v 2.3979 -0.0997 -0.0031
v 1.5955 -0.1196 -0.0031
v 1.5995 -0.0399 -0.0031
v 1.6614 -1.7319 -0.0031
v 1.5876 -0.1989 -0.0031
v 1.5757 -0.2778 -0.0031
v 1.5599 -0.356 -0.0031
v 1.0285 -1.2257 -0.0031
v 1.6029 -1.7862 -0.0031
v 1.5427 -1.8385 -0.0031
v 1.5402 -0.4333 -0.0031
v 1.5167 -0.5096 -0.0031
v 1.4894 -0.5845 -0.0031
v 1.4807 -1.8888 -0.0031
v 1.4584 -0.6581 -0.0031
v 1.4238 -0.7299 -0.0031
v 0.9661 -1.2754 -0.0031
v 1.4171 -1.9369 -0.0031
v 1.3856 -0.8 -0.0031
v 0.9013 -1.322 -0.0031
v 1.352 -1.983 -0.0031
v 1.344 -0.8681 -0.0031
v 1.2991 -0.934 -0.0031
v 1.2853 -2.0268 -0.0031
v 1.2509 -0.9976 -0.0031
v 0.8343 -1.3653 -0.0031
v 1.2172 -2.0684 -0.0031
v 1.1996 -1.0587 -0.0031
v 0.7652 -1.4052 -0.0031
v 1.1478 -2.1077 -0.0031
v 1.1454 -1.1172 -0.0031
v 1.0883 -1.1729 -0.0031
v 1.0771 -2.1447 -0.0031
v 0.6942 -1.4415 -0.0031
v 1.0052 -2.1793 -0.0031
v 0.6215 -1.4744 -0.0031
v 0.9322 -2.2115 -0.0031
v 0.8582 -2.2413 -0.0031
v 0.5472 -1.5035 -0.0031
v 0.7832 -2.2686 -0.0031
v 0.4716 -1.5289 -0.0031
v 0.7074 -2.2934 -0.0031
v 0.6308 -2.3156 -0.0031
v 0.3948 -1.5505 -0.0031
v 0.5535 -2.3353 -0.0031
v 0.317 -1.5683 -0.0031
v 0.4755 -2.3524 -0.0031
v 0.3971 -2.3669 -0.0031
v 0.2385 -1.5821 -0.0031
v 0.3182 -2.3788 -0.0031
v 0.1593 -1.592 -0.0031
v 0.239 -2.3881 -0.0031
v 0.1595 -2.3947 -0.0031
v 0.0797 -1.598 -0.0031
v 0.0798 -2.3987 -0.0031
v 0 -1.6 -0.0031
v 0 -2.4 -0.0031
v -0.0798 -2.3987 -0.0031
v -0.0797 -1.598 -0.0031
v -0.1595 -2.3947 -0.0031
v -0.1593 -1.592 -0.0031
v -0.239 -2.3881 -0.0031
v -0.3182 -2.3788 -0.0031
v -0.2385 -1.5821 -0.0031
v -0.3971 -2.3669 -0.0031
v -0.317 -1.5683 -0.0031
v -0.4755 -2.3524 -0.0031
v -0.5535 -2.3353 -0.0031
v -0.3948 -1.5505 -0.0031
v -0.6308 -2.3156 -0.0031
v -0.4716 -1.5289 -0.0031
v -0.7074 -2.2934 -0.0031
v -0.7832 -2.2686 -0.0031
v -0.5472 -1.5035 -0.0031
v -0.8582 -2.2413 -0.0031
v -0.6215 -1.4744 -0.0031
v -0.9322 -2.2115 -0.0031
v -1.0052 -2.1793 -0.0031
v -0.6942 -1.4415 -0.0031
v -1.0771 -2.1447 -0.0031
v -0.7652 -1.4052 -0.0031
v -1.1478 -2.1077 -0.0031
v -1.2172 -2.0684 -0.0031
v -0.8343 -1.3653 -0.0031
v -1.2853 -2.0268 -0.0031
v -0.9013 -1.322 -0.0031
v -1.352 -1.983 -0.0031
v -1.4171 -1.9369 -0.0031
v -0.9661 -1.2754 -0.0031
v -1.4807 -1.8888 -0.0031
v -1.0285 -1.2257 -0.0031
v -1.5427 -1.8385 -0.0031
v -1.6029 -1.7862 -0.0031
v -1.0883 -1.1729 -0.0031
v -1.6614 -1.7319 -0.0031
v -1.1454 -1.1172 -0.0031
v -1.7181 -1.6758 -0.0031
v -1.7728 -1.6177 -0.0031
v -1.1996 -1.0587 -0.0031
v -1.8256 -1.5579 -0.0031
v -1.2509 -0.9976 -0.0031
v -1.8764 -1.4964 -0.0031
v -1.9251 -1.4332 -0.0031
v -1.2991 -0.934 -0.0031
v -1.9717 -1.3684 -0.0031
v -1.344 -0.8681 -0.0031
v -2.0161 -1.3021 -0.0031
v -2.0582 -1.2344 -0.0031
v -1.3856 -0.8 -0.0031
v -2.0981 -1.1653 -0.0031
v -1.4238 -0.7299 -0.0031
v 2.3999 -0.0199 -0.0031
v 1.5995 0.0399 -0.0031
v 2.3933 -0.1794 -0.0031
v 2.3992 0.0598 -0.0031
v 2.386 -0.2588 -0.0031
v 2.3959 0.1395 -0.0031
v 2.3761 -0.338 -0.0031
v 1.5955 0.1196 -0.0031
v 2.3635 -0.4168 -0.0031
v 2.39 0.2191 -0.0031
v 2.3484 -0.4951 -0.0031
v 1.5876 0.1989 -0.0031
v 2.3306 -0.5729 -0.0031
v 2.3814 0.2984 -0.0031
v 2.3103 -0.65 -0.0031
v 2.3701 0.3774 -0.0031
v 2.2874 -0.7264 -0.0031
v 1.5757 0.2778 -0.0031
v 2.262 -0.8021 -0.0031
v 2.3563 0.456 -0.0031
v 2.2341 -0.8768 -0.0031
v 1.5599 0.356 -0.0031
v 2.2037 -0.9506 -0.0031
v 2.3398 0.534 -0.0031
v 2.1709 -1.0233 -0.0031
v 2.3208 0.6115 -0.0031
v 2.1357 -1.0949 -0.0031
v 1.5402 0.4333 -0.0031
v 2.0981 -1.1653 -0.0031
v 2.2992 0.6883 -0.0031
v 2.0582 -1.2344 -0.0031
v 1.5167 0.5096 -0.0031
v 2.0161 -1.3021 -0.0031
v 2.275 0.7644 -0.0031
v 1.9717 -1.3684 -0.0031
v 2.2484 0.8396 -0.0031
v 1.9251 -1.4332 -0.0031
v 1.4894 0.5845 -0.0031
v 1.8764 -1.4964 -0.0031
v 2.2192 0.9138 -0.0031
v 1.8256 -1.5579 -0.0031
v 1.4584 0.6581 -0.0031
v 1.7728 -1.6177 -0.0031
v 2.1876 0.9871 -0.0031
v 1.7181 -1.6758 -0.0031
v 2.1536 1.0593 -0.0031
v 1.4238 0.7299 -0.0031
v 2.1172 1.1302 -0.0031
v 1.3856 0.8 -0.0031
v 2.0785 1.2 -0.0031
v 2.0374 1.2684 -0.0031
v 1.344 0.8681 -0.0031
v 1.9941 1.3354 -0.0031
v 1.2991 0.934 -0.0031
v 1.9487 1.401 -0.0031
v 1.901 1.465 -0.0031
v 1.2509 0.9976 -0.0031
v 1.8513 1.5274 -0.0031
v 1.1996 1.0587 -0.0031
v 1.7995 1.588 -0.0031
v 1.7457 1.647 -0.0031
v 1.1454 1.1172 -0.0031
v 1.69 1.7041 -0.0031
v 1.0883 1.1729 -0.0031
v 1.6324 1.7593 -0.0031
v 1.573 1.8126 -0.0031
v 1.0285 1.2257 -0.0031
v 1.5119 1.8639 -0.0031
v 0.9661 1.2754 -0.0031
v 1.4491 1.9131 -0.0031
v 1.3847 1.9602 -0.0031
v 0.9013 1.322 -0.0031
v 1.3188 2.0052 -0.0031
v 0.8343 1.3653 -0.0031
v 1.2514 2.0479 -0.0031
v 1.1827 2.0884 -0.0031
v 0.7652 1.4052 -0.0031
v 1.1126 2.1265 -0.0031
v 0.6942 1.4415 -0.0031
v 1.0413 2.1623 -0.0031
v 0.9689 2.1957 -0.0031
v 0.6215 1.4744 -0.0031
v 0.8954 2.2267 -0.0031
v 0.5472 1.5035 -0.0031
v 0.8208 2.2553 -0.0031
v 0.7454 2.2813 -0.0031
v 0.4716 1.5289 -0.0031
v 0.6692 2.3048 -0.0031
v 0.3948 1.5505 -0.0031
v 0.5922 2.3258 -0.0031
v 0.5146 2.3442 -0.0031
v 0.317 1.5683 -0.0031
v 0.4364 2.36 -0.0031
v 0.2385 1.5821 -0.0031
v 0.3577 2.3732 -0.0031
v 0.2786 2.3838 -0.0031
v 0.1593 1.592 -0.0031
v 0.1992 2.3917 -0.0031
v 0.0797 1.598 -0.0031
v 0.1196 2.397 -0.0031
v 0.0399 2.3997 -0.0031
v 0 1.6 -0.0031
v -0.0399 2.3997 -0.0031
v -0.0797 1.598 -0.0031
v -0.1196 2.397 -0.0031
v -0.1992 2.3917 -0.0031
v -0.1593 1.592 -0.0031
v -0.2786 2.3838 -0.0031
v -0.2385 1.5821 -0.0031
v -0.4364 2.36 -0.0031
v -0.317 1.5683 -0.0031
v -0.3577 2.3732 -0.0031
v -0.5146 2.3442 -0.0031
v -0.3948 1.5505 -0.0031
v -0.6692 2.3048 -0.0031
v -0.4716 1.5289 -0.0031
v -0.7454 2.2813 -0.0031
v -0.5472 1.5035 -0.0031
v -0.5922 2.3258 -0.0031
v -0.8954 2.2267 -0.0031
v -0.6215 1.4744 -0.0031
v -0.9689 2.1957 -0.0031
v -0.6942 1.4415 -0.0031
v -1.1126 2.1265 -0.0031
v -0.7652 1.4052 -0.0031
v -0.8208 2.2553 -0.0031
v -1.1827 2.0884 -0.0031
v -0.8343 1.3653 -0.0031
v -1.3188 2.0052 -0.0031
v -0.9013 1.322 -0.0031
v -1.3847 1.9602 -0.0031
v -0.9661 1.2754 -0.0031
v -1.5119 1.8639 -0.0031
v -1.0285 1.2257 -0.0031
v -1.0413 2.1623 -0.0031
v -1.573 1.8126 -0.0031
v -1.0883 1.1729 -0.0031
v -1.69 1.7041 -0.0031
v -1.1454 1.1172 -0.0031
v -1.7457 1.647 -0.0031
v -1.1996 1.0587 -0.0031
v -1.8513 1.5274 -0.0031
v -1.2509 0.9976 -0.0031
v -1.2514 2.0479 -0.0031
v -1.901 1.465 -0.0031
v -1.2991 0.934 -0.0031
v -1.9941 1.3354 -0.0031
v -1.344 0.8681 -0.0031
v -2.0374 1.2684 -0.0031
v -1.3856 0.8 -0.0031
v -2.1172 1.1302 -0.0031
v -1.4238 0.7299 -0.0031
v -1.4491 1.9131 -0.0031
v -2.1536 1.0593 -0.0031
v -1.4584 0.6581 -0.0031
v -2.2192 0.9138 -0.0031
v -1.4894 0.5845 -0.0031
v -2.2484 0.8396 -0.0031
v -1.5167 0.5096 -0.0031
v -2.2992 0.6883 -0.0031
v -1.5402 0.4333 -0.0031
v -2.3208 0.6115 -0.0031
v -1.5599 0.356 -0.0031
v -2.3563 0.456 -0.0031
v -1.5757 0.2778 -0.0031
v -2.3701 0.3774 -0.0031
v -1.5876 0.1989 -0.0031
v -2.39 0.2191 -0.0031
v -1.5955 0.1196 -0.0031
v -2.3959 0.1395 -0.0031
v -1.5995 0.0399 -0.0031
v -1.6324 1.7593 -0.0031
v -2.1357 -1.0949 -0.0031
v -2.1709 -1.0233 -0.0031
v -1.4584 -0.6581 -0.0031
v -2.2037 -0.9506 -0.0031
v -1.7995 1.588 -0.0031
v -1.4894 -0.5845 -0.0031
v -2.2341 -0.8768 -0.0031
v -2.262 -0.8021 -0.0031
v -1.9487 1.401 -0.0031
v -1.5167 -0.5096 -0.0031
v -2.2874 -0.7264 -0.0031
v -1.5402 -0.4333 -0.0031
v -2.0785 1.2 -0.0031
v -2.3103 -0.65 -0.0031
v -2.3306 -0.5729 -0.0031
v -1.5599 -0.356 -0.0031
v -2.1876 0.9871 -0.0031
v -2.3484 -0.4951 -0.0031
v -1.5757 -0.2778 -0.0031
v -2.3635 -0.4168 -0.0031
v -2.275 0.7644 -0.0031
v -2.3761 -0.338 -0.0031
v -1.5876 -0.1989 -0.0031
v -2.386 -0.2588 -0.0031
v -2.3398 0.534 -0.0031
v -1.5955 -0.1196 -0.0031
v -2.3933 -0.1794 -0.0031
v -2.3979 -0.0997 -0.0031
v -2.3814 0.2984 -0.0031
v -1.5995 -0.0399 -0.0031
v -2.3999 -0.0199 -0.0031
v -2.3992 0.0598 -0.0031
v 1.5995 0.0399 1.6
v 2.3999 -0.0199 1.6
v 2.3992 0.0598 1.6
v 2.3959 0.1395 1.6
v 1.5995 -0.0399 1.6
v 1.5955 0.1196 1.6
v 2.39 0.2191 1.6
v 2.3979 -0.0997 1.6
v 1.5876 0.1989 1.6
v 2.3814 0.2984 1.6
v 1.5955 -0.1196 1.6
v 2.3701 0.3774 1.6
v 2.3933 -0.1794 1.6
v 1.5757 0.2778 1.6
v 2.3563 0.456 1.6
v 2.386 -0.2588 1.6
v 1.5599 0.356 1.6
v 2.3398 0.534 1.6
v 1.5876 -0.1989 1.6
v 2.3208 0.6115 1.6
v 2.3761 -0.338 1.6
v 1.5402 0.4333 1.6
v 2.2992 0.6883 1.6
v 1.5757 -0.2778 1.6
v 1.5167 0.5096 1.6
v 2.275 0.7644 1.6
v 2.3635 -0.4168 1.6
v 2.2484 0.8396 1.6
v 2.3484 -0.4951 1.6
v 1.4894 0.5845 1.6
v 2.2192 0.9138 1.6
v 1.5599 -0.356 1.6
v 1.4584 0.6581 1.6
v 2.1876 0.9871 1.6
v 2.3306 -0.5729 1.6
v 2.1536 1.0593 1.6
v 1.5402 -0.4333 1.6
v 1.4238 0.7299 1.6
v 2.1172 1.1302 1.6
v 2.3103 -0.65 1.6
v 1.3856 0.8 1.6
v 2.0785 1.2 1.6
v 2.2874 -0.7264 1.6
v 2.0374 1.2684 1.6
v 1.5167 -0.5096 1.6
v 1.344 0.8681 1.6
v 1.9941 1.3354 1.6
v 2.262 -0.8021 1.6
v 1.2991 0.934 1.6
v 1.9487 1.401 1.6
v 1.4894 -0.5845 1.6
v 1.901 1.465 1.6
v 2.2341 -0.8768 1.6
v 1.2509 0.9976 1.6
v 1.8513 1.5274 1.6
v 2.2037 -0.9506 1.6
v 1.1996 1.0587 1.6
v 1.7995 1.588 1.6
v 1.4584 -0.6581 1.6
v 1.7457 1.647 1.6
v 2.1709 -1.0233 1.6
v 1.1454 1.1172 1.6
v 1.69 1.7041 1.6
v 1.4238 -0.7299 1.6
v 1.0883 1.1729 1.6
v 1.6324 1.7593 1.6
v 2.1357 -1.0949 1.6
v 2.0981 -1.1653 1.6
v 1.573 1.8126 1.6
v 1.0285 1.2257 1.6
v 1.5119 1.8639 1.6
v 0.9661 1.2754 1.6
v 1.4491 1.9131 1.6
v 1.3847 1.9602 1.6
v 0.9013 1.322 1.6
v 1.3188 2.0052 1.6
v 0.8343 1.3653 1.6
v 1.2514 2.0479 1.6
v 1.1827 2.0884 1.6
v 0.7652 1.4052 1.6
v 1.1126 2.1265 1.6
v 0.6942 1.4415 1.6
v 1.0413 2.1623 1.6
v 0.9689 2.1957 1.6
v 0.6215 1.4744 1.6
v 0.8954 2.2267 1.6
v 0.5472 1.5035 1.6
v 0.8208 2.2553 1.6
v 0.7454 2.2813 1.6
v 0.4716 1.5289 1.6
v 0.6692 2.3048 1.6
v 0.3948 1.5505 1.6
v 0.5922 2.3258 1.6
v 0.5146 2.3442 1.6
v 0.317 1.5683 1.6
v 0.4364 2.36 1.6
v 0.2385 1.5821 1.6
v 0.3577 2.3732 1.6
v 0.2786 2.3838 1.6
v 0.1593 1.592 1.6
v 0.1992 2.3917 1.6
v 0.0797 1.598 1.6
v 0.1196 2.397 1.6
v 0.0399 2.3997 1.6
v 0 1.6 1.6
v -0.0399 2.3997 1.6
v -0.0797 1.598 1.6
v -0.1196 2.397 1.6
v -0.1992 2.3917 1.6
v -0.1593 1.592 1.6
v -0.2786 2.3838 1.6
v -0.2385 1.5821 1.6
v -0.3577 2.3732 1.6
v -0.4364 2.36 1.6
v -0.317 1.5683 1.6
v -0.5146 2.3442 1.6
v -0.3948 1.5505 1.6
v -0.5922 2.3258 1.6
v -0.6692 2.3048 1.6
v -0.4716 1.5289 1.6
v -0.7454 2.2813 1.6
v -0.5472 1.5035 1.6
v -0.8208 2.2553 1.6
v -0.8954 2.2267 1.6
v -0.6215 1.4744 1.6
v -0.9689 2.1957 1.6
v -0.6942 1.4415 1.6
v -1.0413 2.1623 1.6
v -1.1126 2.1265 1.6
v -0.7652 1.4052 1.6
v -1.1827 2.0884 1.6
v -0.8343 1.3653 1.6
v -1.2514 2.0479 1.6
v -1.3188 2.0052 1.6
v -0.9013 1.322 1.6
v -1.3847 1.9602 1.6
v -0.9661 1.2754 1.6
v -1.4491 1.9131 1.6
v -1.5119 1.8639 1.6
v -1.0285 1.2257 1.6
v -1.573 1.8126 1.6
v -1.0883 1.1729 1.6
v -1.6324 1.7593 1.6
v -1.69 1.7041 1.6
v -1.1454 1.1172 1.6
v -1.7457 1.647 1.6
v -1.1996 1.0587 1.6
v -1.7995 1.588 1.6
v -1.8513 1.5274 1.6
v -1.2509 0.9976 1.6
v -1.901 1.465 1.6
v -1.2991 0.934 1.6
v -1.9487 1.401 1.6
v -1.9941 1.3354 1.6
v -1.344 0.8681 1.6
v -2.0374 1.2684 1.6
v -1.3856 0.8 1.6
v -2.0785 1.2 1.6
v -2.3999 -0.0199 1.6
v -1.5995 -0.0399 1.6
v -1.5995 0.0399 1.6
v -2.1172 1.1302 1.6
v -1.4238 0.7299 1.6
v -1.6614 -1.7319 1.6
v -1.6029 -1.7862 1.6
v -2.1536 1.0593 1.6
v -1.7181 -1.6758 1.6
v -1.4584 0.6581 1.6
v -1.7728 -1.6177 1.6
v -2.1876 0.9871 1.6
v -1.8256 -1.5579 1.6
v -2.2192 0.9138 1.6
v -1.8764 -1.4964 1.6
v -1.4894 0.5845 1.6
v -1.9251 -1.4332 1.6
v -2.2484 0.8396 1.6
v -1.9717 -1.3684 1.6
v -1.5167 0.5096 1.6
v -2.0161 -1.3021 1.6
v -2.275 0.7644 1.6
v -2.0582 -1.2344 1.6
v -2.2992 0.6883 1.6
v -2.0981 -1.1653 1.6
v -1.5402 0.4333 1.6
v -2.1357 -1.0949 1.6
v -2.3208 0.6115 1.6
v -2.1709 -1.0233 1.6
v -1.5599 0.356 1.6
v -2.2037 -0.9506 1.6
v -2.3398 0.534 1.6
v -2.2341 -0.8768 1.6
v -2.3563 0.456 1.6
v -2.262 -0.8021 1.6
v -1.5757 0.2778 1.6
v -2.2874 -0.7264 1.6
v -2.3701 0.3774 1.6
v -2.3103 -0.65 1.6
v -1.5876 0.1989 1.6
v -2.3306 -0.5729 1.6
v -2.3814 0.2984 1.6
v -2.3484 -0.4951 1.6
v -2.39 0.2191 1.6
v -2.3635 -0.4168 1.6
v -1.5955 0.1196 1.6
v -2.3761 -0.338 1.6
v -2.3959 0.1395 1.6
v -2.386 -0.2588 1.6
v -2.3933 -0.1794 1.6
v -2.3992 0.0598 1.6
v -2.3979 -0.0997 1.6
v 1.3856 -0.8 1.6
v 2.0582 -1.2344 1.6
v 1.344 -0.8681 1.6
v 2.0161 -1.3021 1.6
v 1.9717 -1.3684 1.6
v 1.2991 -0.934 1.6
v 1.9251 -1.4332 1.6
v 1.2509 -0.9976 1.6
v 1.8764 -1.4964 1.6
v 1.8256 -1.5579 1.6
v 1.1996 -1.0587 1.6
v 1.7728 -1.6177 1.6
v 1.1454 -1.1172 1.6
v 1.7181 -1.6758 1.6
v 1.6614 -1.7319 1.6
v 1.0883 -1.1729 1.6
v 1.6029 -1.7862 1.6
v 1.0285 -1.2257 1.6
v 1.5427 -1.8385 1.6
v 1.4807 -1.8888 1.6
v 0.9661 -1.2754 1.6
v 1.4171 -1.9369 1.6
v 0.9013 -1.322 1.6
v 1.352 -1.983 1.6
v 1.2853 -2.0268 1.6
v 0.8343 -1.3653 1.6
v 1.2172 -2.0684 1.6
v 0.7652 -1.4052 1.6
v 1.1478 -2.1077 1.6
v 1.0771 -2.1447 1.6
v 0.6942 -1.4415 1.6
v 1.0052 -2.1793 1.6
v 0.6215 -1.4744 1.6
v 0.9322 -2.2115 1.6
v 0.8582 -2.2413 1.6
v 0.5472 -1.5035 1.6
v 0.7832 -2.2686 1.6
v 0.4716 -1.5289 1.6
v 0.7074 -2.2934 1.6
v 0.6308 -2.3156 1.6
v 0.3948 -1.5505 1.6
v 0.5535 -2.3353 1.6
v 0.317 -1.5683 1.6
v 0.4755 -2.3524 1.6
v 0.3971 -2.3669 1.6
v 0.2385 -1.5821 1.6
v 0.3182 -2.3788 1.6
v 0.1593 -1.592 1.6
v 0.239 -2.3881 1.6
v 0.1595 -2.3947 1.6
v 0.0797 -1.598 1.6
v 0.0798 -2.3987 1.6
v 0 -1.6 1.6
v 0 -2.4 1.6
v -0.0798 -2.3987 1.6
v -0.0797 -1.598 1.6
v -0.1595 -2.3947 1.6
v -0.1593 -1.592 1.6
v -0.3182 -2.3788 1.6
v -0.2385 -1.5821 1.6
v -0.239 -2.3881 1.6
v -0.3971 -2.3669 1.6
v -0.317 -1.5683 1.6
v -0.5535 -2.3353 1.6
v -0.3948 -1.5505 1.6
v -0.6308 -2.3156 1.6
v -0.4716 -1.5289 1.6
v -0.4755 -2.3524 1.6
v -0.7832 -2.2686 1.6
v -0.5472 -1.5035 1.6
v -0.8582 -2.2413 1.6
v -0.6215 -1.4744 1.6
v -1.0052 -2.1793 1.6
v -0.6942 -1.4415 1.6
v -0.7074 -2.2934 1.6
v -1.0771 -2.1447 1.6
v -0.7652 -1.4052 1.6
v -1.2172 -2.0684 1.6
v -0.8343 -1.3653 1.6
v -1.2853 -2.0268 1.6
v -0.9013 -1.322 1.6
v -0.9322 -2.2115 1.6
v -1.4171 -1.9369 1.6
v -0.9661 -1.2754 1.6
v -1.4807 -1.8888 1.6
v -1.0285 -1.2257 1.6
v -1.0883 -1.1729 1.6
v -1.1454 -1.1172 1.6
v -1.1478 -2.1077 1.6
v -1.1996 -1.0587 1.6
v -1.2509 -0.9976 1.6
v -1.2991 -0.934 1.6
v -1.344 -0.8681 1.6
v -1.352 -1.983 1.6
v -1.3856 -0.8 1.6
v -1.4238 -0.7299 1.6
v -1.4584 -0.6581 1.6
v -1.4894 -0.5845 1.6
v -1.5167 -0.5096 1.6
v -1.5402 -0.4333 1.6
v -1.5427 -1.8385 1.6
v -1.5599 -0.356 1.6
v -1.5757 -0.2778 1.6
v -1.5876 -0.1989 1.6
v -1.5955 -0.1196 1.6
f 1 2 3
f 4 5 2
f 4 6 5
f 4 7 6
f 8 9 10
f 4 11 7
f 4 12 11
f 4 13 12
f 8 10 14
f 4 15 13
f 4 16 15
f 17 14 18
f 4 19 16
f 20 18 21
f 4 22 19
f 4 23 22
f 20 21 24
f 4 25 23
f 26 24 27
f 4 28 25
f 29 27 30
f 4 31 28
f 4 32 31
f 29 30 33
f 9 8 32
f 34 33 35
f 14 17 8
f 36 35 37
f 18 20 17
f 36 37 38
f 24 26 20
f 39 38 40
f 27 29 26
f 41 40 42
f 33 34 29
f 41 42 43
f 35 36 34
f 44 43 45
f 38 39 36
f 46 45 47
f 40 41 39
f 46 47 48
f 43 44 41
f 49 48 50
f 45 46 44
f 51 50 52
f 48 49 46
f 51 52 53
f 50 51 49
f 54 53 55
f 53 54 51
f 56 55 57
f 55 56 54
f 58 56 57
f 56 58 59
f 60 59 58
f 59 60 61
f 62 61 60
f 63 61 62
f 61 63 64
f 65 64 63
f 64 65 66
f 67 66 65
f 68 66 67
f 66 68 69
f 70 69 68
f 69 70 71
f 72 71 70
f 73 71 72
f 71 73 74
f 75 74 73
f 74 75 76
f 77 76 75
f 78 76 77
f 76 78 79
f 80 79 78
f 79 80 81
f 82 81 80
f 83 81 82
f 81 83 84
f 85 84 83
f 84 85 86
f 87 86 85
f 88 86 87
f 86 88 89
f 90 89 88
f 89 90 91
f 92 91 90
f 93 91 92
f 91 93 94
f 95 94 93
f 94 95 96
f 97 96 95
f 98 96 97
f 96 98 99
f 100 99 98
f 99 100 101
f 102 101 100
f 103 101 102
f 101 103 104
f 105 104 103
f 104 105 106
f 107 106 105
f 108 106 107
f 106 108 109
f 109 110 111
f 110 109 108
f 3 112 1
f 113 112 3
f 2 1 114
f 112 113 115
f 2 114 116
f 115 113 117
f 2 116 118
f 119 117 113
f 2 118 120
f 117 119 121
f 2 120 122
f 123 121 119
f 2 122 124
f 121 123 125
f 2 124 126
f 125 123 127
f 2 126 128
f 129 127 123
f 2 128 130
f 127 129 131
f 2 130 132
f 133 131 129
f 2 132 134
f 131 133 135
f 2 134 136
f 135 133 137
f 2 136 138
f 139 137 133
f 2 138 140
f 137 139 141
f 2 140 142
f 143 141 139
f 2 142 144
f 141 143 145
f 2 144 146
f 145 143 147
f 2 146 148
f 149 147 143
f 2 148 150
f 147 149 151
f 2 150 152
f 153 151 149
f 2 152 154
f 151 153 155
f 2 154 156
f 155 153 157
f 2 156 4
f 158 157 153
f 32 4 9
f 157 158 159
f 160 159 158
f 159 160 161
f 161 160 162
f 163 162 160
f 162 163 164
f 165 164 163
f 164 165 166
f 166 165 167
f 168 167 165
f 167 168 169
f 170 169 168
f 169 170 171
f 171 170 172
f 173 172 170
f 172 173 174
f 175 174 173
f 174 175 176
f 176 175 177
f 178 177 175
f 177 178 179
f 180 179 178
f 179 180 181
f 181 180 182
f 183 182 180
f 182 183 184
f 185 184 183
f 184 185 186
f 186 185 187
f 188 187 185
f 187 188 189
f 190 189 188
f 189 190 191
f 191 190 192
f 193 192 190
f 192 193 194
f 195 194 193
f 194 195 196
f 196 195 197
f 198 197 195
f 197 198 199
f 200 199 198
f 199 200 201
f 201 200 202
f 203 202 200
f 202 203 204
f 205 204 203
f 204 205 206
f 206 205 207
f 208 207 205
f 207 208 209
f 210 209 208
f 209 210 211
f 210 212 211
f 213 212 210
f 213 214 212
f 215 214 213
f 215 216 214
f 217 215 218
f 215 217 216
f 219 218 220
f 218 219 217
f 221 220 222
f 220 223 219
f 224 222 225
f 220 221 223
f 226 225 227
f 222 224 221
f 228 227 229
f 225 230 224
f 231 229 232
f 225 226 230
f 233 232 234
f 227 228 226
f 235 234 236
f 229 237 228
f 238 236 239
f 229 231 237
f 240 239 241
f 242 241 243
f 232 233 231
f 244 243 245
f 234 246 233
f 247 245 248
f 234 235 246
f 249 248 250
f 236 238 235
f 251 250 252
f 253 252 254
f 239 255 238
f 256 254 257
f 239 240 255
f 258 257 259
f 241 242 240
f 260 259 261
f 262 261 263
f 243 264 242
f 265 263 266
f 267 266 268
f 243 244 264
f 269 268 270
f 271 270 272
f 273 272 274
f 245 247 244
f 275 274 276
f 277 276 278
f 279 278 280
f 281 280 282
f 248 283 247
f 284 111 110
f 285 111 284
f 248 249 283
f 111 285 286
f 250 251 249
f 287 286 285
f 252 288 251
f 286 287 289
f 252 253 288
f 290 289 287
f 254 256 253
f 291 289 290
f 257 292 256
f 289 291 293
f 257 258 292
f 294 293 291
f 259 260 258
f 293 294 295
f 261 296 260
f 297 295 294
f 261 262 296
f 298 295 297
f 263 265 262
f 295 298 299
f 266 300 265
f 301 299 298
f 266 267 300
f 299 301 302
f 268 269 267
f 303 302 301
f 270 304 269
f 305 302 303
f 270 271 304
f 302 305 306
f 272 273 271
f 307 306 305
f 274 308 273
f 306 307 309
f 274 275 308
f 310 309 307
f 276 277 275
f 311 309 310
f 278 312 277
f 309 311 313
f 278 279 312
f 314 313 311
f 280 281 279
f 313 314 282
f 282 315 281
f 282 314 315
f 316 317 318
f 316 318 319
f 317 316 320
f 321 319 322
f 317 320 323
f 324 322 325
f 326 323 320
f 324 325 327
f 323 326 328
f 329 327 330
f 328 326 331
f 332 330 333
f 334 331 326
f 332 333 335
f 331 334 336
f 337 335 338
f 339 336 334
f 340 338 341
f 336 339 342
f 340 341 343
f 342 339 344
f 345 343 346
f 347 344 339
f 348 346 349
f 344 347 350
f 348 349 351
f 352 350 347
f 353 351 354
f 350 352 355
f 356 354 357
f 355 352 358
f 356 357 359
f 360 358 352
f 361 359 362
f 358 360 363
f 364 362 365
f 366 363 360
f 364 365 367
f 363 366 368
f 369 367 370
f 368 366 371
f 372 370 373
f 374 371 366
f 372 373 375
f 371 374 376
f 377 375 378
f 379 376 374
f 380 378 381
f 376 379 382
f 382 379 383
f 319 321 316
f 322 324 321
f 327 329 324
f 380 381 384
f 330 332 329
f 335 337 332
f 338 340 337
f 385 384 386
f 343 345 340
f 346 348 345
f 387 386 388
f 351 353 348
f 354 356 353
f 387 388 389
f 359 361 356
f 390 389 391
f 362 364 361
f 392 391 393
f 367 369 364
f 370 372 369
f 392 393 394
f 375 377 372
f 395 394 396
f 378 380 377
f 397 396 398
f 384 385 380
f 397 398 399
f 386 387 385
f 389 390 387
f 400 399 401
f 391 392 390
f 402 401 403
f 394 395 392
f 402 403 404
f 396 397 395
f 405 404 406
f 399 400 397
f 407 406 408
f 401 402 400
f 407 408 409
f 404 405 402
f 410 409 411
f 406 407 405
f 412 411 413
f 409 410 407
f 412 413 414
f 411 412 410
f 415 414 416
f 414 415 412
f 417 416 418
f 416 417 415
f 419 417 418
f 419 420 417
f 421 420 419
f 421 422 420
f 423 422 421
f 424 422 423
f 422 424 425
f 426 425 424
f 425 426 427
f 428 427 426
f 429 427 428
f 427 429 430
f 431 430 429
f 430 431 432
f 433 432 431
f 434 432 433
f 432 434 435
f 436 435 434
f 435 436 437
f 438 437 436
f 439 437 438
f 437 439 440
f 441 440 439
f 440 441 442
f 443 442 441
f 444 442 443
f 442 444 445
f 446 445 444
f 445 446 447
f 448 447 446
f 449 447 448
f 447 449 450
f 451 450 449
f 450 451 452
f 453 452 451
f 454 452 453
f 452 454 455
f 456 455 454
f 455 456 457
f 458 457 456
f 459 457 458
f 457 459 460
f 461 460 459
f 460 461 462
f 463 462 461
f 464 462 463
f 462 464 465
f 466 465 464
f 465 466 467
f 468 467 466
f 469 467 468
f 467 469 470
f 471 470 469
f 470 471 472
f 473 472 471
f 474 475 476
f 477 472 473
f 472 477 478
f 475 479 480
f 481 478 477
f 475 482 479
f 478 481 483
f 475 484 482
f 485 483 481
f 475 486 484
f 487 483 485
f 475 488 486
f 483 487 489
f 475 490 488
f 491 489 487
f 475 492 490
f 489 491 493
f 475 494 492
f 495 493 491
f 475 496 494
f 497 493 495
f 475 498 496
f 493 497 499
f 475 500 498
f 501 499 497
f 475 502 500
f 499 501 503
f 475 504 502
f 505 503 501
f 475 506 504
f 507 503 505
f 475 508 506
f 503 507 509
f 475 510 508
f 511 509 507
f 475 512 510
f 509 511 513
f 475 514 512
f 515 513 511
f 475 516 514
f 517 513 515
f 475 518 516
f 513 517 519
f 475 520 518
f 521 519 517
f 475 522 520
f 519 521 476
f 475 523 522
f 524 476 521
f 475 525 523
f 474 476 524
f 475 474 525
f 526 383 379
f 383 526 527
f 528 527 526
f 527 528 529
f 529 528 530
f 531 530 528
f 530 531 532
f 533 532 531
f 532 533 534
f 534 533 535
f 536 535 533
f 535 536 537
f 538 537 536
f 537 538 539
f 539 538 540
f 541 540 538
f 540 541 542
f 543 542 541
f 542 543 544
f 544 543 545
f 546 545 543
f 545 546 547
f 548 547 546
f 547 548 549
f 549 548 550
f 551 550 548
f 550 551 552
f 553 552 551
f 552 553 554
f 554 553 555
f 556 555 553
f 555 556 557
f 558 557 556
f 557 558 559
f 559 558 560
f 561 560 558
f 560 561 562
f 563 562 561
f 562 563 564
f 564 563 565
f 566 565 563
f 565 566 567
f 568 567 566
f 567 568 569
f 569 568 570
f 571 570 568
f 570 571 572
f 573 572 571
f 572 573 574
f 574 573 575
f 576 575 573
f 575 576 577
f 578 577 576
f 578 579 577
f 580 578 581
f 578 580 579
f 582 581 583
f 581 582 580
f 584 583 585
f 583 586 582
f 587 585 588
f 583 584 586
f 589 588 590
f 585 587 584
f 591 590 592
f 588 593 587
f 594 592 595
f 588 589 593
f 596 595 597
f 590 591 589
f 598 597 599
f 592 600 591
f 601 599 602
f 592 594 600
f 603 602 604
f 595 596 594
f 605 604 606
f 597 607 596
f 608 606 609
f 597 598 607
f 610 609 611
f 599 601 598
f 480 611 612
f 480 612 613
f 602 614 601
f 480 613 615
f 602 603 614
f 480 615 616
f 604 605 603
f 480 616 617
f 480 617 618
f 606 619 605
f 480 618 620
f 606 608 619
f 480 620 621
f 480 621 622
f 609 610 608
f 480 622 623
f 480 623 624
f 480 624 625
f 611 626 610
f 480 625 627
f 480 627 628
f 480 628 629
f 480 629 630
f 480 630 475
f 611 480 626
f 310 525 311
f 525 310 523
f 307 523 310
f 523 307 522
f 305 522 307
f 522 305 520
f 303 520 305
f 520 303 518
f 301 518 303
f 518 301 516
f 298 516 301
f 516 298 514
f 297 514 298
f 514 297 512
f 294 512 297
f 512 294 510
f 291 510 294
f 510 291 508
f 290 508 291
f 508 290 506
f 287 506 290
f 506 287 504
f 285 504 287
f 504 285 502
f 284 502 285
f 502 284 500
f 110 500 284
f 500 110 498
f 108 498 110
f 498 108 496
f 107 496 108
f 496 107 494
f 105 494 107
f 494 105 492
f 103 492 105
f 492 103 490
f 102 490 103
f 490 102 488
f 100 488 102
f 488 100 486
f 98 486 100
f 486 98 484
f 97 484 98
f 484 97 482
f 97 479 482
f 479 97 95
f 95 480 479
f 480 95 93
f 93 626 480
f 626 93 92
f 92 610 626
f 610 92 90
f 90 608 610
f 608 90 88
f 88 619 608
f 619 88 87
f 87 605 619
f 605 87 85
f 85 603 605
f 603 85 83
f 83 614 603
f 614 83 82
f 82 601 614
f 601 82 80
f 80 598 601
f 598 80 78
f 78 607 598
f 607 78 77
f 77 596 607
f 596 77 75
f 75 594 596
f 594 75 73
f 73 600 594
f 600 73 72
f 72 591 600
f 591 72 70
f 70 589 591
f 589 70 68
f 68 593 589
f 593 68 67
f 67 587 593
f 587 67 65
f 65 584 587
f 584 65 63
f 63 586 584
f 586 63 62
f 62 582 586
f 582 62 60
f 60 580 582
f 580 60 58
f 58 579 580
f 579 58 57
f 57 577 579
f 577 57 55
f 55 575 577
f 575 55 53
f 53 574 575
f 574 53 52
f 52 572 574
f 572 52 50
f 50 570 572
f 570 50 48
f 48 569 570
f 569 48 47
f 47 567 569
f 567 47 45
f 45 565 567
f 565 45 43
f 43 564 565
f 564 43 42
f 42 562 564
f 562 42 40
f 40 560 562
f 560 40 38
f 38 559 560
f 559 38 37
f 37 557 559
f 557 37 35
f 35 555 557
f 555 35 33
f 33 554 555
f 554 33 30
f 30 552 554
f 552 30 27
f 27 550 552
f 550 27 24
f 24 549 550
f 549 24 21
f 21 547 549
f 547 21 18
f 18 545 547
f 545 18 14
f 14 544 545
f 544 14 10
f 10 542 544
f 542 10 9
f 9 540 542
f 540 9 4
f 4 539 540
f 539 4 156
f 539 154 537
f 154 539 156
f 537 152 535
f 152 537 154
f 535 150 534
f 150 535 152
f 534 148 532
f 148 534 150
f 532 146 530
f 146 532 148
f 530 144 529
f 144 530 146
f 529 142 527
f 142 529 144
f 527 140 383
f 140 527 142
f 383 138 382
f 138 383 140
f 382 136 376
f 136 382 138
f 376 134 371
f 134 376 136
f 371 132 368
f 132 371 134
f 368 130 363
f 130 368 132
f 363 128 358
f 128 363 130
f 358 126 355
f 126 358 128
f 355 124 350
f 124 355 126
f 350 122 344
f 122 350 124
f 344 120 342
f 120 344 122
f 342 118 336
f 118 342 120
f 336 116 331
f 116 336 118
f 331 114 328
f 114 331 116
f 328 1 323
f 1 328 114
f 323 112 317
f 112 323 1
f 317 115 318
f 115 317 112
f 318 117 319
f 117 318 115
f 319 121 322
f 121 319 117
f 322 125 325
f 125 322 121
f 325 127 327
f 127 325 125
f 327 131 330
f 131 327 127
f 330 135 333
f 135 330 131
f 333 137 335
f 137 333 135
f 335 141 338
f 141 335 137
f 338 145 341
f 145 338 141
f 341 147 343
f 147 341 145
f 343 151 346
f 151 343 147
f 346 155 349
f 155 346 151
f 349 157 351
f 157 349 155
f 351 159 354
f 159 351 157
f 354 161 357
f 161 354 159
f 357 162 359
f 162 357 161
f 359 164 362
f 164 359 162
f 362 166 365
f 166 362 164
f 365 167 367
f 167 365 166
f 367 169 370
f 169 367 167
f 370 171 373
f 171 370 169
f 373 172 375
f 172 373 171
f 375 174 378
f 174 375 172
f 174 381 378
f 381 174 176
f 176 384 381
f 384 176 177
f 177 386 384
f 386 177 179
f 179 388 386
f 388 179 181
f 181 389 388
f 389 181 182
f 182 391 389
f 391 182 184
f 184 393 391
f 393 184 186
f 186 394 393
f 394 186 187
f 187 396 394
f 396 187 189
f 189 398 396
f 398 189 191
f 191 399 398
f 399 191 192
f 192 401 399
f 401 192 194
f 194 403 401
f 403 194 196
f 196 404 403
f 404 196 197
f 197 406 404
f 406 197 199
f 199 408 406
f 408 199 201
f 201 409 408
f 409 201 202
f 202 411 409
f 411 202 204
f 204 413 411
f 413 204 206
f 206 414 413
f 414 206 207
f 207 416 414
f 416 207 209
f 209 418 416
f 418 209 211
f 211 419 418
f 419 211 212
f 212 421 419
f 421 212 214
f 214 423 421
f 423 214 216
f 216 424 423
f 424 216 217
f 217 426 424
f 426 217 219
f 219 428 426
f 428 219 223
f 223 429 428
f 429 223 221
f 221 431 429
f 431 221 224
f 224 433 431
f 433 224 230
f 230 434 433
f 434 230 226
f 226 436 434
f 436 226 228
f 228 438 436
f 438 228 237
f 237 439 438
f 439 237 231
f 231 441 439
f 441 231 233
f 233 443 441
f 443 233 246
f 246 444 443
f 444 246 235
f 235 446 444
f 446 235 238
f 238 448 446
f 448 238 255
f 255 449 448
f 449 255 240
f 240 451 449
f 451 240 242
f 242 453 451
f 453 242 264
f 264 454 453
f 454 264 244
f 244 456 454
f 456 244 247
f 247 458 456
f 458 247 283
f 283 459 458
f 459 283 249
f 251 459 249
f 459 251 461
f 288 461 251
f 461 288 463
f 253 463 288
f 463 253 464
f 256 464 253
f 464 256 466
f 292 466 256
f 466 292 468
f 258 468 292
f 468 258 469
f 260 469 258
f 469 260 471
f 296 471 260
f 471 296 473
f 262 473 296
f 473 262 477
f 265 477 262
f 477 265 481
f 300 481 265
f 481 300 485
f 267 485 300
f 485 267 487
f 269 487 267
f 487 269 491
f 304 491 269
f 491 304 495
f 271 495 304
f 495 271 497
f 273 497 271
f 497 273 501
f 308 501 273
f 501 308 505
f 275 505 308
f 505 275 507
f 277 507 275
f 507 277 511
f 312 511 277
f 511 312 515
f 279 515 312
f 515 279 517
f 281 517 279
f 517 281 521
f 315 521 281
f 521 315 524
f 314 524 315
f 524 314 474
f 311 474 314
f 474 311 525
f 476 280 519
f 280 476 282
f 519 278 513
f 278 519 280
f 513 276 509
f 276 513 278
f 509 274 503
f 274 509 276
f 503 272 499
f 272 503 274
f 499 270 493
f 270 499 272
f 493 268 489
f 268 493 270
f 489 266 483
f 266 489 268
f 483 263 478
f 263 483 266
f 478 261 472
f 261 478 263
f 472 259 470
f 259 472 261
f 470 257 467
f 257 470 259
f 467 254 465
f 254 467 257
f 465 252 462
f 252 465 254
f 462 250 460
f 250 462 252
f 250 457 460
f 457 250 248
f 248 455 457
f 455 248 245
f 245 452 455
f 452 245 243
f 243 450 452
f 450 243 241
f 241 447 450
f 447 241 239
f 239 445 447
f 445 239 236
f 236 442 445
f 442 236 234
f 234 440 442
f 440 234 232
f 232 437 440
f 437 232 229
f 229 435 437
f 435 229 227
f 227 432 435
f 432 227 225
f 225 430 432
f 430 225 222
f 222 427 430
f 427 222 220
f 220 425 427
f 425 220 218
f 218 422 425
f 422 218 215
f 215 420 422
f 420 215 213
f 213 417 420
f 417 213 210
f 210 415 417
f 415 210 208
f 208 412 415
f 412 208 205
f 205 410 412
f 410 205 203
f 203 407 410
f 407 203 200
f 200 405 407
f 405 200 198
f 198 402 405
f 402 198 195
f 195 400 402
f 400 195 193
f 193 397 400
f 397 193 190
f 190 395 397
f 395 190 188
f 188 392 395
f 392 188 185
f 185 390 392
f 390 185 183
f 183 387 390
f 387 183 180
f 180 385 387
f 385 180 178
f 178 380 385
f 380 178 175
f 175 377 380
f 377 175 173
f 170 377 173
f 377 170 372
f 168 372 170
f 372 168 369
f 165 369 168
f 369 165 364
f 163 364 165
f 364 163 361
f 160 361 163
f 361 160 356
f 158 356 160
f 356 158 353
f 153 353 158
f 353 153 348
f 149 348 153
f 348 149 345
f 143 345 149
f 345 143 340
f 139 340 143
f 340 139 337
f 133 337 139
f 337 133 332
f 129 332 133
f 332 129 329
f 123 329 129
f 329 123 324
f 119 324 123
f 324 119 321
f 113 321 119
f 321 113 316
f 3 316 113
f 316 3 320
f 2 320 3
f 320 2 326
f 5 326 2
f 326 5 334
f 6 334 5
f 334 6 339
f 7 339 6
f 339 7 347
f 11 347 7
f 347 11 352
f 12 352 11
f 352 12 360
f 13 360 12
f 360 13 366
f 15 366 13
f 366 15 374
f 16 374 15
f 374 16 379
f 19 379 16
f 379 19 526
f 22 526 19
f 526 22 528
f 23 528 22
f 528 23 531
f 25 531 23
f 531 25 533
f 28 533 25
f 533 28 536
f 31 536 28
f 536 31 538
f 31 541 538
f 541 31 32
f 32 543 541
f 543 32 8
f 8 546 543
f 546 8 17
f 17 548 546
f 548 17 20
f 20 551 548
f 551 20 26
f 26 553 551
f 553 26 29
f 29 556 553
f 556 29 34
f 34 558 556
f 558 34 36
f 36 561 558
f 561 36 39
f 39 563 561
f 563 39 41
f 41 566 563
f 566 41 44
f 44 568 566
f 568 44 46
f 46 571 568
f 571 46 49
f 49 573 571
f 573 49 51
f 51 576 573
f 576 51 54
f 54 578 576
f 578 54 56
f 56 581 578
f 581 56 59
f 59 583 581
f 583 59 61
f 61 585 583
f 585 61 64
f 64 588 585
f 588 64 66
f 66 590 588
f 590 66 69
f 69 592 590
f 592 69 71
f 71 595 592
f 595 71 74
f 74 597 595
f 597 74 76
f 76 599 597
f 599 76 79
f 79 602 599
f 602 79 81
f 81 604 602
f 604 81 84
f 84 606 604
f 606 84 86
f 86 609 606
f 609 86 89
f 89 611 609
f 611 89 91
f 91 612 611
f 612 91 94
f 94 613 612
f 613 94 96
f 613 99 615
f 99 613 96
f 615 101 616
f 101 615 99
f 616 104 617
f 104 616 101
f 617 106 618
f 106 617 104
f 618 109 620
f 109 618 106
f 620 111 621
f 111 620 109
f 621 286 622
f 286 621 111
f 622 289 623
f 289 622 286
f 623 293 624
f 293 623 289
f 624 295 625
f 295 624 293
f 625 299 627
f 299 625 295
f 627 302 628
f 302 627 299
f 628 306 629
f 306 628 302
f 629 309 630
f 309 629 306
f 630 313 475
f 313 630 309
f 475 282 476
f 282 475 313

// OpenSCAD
use <../lib.scad>
use <../p/4-4cyli.scad>
use <../p/r04o1500.scad>
use <s/30367cs01.scad>
$fa=1; $fs=0.2;
function ldraw_lib__30367c(realsolid=false) = [
// 0 Cylinder  2 x  2 with Dome Top with Axle Hole and Hollow Stud
// 0 Name: 30367c.dat
// 0 Author: Magnus Forsberg [MagFors]
// 0 !LDRAW_ORG Part UPDATE 2012-03
// 0 !LICENSE Licensed under CC BY 2.0 and CC BY 4.0 : see CAreadme.txt
// 
// 0 BFC CERTIFY CCW
  [0,"BFC","CERTIFY"],
  [0,"BFC","CCW"],
// 
// 0 !KEYWORDS astromech, droid, head, minifig, R2-D2, Robot, Star Wars
// 
// 0 !HISTORY 2012-12-28 [PTadmin] Official Update 2012-03
// 
// 
// 1 16 0 0 0 1 0 0 0 1 0 0 0 1 s\30367cs01.dat
  [1,16,0,0,0,1,0,0,0,1,0,0,0,1, ldraw_lib__s__30367cs01(realsolid)],
// 0 // outside surface
// 1 16 0 16 0 8 0 0 0 -10.667 0 0 0 -8 r04o1500.dat
  [1,16,0,16,0,8,0,0,0,-10.667,0,0,0,-8, ldraw_lib__r04o1500(realsolid)],
// 1 16 0 16 0 0 0 -8 0 -10.667 0 -8 0 0 r04o1500.dat
  [1,16,0,16,0,0,0,-8,0,-10.667,0,-8,0,0, ldraw_lib__r04o1500(realsolid)],
// 1 16 0 16 0 -8 0 0 0 -10.667 0 0 0 8 r04o1500.dat
  [1,16,0,16,0,-8,0,0,0,-10.667,0,0,0,8, ldraw_lib__r04o1500(realsolid)],
// 1 16 0 16 0 0 0 8 0 -10.667 0 8 0 0 r04o1500.dat
  [1,16,0,16,0,0,0,8,0,-10.667,0,8,0,0, ldraw_lib__r04o1500(realsolid)],
// 1 16 0 16 0 20 0 0 0 4 0 0 0 20 4-4cyli.dat
  [1,16,0,16,0,20,0,0,0,4,0,0,0,20, ldraw_lib__4_4cyli(realsolid)],
];
module ldraw_lib__30367c(step=0, col=false, unit=2/5, alt=false, line=0.2, solid=!$preview)
    makepoly(ldraw_lib__30367c(solid), step=step, col=col, unit=unit, alt=alt, line=line, solid=solid);
ldraw_lib__30367c(line=0.2);
